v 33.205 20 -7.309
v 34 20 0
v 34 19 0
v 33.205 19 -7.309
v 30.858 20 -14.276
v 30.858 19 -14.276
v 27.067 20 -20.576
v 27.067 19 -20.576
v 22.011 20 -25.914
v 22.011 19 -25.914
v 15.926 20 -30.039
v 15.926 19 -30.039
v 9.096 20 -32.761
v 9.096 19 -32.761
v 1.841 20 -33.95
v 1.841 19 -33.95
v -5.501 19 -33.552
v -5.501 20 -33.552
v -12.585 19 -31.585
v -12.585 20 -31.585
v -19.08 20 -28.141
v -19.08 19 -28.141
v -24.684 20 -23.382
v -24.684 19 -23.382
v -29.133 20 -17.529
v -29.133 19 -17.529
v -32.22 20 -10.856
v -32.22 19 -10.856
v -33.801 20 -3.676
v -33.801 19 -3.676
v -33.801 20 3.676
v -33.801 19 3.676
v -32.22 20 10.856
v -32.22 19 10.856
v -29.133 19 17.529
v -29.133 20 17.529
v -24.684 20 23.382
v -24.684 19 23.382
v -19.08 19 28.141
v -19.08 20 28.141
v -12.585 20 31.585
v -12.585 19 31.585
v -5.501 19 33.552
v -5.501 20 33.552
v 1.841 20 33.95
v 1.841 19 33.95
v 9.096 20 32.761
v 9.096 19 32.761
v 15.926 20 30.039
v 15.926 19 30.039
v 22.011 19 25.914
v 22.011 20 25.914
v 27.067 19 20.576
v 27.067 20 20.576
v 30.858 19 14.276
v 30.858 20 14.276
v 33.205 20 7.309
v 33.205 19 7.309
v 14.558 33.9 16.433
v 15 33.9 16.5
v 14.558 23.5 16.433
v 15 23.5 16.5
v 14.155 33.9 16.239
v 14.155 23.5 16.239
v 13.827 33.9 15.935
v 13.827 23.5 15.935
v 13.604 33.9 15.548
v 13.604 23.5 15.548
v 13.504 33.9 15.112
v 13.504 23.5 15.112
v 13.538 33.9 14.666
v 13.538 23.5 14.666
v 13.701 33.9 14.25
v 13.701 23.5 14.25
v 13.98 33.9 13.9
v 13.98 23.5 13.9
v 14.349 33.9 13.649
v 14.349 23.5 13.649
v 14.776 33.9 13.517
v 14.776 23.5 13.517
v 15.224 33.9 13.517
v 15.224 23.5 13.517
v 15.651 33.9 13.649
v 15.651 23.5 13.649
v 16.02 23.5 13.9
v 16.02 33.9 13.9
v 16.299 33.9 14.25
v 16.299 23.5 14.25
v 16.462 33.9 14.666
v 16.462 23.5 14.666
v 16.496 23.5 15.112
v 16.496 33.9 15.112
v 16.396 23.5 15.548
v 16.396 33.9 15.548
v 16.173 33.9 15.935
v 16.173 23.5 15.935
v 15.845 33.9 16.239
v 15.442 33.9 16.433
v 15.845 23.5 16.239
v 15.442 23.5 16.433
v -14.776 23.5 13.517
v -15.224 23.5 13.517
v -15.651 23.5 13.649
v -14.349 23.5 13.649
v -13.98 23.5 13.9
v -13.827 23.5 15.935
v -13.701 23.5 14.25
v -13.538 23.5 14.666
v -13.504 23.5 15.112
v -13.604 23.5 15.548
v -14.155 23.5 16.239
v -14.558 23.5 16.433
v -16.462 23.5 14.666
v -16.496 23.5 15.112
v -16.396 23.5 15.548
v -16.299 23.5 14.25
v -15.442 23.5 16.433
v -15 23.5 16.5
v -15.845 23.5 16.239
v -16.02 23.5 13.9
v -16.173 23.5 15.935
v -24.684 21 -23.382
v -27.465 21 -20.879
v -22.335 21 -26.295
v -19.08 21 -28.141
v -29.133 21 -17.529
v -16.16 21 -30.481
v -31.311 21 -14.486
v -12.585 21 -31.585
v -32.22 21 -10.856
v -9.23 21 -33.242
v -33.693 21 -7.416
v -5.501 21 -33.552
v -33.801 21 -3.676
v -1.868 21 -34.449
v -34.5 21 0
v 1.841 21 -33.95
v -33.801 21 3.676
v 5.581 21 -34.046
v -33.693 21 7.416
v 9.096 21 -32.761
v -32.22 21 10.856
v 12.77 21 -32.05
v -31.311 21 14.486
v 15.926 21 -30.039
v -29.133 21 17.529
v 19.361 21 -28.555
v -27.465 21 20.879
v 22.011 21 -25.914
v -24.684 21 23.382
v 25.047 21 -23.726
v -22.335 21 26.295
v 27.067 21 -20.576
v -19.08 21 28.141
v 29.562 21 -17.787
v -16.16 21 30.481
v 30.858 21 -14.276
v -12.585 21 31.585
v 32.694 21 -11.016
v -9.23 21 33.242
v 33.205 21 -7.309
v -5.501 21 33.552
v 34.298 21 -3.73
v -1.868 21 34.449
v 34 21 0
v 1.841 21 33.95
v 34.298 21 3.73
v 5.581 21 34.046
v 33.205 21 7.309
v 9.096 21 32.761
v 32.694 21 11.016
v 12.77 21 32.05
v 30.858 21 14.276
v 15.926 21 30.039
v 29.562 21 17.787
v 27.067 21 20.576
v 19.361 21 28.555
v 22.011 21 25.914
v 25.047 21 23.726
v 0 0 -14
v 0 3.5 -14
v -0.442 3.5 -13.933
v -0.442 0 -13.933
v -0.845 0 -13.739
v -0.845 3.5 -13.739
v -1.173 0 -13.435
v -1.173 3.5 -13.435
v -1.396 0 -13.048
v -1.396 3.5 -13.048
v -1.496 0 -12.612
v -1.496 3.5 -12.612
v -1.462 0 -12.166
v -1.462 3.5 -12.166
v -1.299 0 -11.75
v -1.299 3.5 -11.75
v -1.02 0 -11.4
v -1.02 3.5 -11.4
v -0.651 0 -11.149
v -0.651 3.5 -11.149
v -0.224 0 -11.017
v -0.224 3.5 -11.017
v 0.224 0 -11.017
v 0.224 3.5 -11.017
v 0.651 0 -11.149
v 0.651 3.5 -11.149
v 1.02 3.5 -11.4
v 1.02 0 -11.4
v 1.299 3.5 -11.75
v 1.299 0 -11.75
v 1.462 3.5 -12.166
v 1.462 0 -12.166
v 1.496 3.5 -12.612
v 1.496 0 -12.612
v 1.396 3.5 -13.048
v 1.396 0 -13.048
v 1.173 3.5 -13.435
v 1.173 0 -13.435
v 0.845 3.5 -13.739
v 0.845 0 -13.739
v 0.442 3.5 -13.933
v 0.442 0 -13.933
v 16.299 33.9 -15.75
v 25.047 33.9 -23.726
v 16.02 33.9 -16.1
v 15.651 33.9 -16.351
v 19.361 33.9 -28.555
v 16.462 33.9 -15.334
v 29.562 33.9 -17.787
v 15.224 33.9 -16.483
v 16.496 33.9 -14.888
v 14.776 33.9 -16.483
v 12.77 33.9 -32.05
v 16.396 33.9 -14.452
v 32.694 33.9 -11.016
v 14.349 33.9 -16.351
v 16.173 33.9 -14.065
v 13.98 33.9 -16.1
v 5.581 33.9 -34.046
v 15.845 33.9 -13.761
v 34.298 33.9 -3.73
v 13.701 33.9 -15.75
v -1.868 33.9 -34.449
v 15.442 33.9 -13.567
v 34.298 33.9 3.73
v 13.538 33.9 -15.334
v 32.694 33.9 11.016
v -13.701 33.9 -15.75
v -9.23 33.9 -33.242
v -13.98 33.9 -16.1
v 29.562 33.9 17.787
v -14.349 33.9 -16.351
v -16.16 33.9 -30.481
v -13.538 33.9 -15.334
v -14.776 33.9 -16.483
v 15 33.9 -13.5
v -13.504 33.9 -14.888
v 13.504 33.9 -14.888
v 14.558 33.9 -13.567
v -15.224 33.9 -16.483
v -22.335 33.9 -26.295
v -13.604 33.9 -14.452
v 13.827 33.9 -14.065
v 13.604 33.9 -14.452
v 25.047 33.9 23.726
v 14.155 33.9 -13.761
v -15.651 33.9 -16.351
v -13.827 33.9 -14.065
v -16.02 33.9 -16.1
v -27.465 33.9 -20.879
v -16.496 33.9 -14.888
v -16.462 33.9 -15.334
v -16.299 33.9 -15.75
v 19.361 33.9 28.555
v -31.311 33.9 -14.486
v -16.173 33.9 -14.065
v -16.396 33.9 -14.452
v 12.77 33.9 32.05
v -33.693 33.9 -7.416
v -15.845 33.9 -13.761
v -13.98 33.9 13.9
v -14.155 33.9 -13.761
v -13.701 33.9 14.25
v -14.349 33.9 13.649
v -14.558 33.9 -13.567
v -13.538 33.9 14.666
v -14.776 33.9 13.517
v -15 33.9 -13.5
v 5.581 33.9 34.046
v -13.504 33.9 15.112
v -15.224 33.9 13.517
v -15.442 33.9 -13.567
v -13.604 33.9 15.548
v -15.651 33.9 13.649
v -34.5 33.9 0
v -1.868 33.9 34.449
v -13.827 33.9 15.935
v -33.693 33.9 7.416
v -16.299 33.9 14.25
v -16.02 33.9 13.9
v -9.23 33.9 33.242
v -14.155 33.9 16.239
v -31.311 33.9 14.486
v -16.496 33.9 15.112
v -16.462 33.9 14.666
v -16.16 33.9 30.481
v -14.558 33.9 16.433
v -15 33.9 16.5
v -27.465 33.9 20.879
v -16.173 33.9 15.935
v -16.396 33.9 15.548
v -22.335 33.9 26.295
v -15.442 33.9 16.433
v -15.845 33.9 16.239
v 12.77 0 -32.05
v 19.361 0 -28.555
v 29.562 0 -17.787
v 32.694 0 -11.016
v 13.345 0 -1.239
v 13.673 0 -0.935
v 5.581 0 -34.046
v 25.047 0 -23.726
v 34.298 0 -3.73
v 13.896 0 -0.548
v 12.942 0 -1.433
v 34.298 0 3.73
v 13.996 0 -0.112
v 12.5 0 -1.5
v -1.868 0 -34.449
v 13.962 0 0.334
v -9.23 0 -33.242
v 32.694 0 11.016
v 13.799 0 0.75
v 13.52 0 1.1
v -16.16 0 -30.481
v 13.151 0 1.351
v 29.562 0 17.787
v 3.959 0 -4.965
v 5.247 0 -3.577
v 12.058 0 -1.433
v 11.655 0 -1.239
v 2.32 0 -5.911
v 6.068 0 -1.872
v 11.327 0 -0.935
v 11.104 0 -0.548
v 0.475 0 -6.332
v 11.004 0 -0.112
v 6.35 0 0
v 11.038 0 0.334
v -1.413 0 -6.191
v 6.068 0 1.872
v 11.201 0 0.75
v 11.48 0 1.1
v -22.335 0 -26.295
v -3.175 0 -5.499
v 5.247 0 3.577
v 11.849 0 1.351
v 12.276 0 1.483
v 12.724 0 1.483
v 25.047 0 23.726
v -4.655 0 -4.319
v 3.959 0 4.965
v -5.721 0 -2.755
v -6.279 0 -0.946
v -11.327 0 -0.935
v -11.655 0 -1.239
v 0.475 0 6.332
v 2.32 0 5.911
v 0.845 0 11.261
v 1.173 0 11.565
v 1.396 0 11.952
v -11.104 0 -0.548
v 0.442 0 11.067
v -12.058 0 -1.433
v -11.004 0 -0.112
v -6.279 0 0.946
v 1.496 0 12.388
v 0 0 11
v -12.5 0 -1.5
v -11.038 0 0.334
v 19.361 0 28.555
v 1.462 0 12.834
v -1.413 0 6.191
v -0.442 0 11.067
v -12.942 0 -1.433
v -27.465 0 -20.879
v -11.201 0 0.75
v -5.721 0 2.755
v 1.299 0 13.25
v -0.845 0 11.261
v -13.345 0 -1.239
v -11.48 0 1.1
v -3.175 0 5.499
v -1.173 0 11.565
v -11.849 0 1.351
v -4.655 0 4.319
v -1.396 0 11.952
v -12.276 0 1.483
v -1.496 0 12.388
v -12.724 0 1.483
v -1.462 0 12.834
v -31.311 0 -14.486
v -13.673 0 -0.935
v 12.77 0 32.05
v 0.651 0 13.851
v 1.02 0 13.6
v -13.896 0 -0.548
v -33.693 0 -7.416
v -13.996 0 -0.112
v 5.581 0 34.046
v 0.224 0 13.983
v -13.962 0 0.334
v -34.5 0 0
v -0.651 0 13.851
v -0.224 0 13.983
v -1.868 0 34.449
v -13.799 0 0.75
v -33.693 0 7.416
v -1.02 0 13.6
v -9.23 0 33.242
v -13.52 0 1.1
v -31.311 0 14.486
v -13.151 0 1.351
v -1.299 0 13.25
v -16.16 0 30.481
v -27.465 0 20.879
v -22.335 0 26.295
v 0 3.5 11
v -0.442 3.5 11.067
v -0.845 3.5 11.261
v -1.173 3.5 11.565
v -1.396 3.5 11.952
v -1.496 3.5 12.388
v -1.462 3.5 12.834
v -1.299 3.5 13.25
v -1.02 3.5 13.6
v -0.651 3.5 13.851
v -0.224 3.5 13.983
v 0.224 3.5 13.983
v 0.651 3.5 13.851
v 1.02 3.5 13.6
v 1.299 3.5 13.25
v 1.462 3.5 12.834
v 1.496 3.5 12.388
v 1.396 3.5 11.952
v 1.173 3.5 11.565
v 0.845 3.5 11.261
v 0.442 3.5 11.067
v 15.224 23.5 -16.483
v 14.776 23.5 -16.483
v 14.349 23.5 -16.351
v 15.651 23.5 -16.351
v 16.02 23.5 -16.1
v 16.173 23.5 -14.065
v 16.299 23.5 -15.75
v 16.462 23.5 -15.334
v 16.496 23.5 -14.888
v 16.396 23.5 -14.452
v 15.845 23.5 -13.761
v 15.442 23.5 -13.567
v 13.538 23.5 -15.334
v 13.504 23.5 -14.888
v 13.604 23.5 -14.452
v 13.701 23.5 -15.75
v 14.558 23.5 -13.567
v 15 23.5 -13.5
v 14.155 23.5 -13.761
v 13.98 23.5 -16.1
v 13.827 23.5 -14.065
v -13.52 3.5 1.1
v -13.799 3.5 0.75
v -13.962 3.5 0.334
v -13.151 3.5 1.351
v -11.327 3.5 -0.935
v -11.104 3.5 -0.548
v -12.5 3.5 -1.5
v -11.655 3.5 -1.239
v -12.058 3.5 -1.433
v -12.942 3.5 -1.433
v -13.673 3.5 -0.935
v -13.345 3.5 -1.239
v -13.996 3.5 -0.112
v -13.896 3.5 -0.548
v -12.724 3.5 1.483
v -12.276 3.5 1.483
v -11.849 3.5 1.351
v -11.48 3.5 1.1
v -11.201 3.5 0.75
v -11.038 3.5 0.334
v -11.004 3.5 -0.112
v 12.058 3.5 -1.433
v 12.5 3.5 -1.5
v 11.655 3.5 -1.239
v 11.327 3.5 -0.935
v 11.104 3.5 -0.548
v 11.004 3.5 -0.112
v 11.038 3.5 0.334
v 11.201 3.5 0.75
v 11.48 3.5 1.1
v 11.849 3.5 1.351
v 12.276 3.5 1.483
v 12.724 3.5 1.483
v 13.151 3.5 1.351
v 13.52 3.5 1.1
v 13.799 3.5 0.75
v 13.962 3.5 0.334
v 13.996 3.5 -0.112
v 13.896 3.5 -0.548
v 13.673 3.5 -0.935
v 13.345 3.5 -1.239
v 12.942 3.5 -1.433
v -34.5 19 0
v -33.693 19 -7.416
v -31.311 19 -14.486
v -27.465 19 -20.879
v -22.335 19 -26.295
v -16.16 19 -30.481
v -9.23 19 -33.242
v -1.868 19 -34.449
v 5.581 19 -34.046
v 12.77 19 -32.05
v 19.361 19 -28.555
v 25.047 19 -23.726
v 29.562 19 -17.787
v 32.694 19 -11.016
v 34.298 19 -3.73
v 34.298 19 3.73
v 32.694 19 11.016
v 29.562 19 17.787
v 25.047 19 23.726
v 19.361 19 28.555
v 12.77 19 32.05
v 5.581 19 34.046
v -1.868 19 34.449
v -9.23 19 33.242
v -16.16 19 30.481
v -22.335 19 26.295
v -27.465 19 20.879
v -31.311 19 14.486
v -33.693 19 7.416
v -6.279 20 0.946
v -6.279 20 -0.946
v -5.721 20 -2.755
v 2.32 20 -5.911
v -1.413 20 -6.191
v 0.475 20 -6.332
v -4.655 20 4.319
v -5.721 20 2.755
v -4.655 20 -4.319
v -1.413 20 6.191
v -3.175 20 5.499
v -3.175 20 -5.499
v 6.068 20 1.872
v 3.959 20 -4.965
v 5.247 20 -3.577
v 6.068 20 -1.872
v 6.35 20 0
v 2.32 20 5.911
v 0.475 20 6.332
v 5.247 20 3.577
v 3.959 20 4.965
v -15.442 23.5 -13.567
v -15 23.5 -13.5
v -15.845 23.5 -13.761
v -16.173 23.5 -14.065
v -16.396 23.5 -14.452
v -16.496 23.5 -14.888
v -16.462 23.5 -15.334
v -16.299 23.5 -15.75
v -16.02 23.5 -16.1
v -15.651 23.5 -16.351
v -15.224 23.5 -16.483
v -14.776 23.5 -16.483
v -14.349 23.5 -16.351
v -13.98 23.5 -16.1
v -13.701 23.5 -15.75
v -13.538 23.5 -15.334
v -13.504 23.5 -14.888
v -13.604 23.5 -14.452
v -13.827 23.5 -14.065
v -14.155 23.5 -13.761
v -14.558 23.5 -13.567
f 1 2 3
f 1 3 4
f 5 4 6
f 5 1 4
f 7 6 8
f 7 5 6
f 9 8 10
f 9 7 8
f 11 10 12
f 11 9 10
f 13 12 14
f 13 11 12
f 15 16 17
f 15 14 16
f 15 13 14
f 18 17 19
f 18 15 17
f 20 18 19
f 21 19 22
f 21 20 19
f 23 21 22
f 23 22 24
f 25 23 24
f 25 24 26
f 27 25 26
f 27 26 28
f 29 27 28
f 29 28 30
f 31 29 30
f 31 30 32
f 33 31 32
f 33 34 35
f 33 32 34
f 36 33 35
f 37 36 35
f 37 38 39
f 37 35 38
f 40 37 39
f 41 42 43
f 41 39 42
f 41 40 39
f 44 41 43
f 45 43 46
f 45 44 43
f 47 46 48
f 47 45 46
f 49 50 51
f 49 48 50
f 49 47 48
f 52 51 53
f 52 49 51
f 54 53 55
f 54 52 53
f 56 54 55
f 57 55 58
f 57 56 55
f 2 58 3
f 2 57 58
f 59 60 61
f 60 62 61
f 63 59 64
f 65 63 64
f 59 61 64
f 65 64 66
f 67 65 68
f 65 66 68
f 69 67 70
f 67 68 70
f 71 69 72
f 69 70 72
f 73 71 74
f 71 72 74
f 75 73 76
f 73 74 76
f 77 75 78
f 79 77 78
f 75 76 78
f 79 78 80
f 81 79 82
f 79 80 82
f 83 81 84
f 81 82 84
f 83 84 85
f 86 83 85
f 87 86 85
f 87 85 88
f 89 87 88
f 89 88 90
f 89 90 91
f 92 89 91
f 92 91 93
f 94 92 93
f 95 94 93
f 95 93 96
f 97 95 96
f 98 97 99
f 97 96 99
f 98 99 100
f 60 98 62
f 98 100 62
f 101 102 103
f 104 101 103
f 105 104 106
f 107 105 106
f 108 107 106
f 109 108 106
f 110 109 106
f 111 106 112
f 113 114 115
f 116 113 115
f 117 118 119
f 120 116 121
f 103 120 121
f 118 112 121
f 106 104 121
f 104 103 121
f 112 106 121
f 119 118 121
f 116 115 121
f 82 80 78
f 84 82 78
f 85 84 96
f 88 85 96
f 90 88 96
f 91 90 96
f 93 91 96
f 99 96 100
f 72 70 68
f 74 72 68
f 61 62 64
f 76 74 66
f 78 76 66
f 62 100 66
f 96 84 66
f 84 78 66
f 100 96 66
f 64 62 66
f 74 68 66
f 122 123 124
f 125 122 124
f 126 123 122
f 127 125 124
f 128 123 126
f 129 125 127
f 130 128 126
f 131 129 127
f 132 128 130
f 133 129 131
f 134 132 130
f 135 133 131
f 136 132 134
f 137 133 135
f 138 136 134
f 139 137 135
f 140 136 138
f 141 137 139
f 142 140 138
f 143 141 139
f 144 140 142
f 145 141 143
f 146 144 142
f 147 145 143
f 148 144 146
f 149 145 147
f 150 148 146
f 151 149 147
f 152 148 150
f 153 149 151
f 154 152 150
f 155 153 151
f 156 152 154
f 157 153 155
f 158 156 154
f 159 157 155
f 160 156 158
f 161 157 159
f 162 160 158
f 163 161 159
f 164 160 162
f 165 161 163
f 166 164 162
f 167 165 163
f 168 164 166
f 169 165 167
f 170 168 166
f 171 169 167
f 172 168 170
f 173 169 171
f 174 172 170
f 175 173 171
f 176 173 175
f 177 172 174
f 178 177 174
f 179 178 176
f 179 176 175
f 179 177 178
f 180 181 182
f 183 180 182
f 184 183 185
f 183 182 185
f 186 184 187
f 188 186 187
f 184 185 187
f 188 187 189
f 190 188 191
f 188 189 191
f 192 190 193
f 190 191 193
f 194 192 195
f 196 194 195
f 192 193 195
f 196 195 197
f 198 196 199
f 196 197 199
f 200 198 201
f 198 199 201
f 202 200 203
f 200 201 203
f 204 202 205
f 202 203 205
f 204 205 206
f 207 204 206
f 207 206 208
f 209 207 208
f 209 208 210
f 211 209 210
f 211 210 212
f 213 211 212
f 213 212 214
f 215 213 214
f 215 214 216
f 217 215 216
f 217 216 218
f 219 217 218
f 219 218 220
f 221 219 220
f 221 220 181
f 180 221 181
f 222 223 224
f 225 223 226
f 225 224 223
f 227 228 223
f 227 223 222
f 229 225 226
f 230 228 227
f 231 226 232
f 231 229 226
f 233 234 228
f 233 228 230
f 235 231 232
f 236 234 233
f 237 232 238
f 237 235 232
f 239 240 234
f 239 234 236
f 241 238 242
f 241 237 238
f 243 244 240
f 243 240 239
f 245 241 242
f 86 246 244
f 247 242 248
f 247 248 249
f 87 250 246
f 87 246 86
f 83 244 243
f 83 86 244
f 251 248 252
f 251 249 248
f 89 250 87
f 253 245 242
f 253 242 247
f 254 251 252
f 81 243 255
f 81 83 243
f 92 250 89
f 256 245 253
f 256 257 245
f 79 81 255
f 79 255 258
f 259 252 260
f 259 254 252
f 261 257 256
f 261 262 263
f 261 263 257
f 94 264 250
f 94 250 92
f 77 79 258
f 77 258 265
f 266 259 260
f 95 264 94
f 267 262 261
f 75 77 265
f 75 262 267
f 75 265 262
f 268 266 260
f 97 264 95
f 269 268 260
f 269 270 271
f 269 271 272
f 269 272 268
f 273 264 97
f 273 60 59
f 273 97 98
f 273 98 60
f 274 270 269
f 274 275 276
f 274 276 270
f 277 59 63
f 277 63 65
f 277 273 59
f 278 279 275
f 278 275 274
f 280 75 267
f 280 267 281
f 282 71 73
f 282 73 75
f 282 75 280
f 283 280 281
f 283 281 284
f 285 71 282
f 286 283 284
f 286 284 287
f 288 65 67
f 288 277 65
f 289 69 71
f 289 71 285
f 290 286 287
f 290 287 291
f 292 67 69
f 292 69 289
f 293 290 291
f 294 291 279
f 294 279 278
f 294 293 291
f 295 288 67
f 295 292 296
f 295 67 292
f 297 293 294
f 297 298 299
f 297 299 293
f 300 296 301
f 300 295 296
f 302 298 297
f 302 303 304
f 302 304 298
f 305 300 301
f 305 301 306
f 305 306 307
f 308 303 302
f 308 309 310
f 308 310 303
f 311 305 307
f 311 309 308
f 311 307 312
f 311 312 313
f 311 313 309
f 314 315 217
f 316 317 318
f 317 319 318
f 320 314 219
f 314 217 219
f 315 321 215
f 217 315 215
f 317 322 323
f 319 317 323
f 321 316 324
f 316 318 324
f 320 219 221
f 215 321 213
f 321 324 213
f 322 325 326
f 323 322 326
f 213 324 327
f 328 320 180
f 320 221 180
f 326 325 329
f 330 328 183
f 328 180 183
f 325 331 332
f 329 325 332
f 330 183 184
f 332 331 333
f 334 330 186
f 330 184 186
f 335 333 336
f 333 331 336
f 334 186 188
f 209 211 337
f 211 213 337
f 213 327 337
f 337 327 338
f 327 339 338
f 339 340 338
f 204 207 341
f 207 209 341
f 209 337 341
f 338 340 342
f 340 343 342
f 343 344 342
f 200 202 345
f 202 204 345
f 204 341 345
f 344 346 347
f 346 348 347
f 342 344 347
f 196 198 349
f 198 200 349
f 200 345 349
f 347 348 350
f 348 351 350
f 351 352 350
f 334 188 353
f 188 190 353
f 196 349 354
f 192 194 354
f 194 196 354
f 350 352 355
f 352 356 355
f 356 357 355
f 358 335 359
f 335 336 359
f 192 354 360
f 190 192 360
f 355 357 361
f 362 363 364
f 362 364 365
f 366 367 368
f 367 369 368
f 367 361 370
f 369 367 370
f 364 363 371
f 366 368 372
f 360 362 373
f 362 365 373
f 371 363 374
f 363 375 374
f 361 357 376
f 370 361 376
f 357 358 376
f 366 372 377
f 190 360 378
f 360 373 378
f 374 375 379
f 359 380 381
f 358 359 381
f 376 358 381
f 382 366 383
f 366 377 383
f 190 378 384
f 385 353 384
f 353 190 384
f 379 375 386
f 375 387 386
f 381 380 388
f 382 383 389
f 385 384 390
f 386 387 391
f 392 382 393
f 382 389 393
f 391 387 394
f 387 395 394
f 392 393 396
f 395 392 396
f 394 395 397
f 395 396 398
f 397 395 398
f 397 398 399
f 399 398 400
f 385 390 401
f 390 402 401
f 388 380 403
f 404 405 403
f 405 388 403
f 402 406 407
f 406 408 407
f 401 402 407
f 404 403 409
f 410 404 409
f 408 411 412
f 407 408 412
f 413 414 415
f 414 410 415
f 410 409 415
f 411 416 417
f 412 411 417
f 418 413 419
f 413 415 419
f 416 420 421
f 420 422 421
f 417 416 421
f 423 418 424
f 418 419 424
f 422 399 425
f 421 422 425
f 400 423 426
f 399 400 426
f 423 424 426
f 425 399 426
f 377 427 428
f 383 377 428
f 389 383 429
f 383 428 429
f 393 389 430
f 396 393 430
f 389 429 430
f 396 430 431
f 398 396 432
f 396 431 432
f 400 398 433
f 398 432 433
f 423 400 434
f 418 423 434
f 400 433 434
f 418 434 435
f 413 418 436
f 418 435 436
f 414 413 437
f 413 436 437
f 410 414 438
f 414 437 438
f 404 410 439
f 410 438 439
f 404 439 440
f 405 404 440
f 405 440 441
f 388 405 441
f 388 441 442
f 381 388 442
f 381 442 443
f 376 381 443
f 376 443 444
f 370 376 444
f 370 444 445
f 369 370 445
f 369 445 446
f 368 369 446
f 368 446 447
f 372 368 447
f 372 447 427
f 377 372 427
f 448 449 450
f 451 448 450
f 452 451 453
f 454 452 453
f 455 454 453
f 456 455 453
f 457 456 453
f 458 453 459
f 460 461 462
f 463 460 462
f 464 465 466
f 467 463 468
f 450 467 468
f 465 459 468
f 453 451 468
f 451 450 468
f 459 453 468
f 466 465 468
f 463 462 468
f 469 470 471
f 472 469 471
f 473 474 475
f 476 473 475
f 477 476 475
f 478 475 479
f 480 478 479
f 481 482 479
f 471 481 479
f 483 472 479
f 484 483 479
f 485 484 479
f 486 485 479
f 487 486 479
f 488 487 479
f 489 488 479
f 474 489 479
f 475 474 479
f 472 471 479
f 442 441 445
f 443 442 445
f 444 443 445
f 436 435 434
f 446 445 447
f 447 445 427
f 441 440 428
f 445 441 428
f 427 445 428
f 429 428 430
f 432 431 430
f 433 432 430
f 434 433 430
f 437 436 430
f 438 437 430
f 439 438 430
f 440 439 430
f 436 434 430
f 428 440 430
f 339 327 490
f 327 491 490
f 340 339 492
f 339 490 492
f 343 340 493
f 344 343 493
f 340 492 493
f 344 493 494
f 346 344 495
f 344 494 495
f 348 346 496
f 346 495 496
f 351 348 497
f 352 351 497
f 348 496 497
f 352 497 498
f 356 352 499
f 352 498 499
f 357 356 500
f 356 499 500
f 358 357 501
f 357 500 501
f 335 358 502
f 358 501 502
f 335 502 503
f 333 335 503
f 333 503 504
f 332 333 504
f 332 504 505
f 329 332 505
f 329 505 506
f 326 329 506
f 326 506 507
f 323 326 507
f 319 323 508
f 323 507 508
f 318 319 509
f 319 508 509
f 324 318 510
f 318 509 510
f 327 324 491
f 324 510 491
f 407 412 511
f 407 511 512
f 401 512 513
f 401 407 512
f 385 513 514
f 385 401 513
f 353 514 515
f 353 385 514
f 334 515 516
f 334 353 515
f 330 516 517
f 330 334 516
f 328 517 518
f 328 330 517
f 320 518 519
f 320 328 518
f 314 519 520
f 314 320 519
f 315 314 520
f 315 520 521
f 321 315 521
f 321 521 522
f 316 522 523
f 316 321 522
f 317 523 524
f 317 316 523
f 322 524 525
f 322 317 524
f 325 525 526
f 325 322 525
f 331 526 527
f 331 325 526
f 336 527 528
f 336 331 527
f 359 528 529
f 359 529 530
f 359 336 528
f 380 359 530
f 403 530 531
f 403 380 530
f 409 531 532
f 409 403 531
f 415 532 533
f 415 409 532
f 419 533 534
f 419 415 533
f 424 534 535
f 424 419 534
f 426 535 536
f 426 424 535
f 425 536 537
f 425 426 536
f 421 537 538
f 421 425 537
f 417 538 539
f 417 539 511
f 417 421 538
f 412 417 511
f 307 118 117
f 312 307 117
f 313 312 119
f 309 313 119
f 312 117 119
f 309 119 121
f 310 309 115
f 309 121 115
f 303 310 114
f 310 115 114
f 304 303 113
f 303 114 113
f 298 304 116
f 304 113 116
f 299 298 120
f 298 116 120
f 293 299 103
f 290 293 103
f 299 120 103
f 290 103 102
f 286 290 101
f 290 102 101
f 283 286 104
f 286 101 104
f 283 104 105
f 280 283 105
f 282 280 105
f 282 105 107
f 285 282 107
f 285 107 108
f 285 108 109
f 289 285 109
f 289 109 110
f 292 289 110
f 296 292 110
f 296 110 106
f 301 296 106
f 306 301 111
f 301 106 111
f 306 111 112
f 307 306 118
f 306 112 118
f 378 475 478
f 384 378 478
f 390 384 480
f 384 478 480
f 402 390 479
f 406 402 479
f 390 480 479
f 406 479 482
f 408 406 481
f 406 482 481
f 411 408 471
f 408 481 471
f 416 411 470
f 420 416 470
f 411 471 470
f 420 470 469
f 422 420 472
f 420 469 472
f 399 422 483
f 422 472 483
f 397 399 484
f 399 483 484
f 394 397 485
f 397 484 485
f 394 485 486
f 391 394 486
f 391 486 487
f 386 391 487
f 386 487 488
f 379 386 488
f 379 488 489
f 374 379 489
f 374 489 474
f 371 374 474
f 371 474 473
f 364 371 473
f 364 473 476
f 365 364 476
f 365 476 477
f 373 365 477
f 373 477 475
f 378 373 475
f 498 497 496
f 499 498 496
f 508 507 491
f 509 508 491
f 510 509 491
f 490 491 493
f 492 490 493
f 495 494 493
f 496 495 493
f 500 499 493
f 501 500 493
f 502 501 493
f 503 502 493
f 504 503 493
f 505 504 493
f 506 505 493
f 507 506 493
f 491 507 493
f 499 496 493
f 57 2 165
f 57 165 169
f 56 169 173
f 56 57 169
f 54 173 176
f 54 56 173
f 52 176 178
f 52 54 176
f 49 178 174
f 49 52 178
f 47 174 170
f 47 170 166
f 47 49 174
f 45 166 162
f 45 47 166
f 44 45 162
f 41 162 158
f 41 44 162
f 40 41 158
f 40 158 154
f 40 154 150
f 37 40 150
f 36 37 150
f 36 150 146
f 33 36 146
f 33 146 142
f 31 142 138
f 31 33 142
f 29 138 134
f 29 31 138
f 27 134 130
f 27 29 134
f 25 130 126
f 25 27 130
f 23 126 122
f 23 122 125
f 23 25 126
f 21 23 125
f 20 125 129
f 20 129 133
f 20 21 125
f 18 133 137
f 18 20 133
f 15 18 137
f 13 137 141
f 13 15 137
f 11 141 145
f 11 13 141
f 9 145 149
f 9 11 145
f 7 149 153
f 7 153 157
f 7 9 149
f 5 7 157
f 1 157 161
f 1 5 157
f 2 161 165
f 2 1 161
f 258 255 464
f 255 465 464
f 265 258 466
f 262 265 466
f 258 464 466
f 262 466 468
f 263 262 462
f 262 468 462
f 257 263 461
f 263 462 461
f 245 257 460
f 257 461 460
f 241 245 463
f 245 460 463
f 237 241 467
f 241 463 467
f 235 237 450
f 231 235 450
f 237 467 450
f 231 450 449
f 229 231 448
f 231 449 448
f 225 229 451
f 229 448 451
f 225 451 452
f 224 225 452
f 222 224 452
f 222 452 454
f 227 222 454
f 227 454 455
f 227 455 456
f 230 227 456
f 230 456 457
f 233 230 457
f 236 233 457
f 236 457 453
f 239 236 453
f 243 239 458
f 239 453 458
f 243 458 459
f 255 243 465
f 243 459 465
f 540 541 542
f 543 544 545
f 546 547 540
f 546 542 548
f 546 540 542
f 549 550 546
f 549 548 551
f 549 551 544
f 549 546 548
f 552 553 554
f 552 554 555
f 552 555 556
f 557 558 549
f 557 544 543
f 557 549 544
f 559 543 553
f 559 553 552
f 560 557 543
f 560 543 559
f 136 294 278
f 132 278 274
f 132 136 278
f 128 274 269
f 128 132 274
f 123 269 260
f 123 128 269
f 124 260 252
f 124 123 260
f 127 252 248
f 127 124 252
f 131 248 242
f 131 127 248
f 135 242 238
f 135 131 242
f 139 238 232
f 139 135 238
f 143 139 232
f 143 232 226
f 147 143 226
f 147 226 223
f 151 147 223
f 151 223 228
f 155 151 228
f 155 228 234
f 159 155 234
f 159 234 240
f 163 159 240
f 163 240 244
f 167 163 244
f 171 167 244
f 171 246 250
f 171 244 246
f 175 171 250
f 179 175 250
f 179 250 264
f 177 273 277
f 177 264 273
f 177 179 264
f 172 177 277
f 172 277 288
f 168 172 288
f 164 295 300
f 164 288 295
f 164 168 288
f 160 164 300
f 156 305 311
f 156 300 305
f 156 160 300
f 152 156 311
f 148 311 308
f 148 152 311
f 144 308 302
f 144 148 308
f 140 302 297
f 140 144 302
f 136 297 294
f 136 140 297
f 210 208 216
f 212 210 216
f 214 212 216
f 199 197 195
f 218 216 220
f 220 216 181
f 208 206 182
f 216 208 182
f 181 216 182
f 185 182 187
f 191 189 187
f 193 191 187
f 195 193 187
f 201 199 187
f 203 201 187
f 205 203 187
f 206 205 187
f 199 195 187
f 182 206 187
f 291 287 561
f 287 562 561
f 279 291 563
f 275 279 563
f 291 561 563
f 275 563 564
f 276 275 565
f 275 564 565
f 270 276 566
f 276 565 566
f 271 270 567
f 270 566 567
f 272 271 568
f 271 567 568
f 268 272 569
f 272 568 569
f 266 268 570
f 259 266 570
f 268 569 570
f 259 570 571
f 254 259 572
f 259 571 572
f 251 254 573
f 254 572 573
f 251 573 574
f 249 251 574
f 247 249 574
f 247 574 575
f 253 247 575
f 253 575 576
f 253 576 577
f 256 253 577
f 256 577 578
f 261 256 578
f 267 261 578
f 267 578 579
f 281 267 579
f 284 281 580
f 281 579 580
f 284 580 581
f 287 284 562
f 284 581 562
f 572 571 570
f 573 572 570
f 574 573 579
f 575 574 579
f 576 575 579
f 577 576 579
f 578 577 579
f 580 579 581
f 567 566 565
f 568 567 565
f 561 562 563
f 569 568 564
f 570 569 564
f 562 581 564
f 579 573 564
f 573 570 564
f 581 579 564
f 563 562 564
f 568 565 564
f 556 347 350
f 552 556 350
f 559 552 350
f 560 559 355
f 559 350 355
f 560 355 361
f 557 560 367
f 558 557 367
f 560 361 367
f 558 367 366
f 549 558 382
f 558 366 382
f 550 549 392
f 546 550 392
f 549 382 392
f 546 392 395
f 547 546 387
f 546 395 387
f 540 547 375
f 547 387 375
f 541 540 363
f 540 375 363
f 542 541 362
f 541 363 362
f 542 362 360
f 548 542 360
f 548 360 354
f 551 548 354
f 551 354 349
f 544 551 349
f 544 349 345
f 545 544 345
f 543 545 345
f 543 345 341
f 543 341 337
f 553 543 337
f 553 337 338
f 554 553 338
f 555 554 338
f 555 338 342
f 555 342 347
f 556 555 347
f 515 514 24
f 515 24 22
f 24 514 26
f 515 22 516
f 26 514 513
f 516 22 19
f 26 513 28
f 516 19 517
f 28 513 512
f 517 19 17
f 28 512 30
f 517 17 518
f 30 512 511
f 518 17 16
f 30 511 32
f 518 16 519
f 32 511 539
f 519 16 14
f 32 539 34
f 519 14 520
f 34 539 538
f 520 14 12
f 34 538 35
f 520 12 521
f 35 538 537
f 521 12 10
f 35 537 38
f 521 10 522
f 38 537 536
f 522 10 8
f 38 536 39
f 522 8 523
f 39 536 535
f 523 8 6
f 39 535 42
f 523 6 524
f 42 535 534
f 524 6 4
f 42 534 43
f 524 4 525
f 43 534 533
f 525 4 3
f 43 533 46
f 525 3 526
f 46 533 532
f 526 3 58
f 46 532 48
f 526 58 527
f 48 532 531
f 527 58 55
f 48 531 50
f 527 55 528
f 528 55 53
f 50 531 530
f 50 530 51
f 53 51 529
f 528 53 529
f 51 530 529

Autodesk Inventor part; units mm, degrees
ref_plane "YZ Plane" through (0, 0, 0) normal (1, 0, 0) x (0, 1, 0)
ref_plane "XZ Plane" through (0, 0, 0) normal (0, 1, 0) x (-1, 0, 0)
sketch "Sketch1" plane through (0, 0, 0) normal (0, 1, 0) x (-1, 0, 0)
  circle A0 centre (0, 0) radius 34.5
  dimension "d0" = 69
extrude "Extrusion1" add sketch "Sketch1" along normal blind 33.9
sketch "Sketch2" plane through (0, 33.9, 0) normal (0, 1, 0) x (1, 0, 0)
  circle A0 centre (0, 0) radius 34.5 projected
  line L0 (-15, -15) -> (15, -15)
  line L1 (15, -15) -> (15, 15)
  line L2 (15, 15) -> (-15, 15)
  line L3 (-15, 15) -> (-15, -15)
  line L4 (-15, -15) -> (15, 15) construction
  line L5 (15, -15) -> (-15, 15) construction
  circle A1 centre (-15, 15) radius 1.5
  circle A2 centre (15, 15) radius 1.5
  circle A3 centre (-15, -15) radius 1.5
  circle A4 centre (15, -15) radius 1.5
  dimension "d3" = 30
  dimension "d4" = 30
  dimension "d5" = 3
  dimension "d6" = 3
  dimension "d7" = 3
  dimension "d8" = 3
hole "Hole1" at (-15, 33.9, 15) at (15, 33.9, 15) at (-15, 33.9, -15) at (15, 33.9, -15) direction (0, -1, 0) diameter 3 depth 10.4
sketch "Sketch3" plane through (0, 0, 0) normal (0, -1, 0) x (1, 0, 0)
  circle A0 centre (0, 0) radius 34.5 projected
  circle A1 centre (0, 0) radius 6.35
  dimension "d16" = 12.7
extrude "Extrusion2" cut sketch "Sketch3" against normal blind 20 contours A1
ref_plane "Work Plane1" through (0, 20, 0) normal (0, -1, 0) x (1, 0, 0)
sketch "Sketch4" plane through (0, 20, 0) normal (0, -1, 0) x (1, 0, 0)
  circle A0 centre (0, 0) radius 6.35 projected
  circle A1 centre (0, 0) radius 34.5 projected
  circle A2 centre (0, 0) radius 34
  dimension "d20" = 68
extrude "Extrusion3" cut sketch "Sketch4" along normal mid plane 2 contours A1
sketch "Sketch5" plane through (0, 0, 0) normal (0, -1, 0) x (1, 0, 0)
  circle A0 centre (0, 0) radius 6.35 projected
  circle A1 centre (0, 0) radius 34.5 projected
  circle A2 centre (0, 0) radius 12.5
  line L0 (0, -1) -> (0, -12.5)
  circle A3 centre (0, -12.5) radius 2
  circle A4 centre (12.5, 0) radius 2
  circle A5 centre (0, 12.5) radius 2
  circle A6 centre (-12.5, 0) radius 2
  dimension "d23" = 25
  dimension "d24" = 4
  dimension "d27" = 360
hole "Hole2" at (0, 0, -12.5) at (12.5, 0, 0) at (0, 0, 12.5) at (-12.5, 0, 0) direction (0, 1, 0) diameter 3 depth 3.5
sketch "Sketch6" plane through (0, 0, 0) normal (0, -1, 0) x (1, 0, 0)
  line L0 (-63, 66) -> (64.0177, 66) construction
  line L1 (64.0177, 66) -> (64.0177, -63.3993) construction
  line L2 (64.0177, -63.3993) -> (-63, -63.3993) construction
  line L3 (-63, -63.3993) -> (-63, 66) construction
  point P0 (0, 0)
decal "Decal1"
properties part number "motor"
